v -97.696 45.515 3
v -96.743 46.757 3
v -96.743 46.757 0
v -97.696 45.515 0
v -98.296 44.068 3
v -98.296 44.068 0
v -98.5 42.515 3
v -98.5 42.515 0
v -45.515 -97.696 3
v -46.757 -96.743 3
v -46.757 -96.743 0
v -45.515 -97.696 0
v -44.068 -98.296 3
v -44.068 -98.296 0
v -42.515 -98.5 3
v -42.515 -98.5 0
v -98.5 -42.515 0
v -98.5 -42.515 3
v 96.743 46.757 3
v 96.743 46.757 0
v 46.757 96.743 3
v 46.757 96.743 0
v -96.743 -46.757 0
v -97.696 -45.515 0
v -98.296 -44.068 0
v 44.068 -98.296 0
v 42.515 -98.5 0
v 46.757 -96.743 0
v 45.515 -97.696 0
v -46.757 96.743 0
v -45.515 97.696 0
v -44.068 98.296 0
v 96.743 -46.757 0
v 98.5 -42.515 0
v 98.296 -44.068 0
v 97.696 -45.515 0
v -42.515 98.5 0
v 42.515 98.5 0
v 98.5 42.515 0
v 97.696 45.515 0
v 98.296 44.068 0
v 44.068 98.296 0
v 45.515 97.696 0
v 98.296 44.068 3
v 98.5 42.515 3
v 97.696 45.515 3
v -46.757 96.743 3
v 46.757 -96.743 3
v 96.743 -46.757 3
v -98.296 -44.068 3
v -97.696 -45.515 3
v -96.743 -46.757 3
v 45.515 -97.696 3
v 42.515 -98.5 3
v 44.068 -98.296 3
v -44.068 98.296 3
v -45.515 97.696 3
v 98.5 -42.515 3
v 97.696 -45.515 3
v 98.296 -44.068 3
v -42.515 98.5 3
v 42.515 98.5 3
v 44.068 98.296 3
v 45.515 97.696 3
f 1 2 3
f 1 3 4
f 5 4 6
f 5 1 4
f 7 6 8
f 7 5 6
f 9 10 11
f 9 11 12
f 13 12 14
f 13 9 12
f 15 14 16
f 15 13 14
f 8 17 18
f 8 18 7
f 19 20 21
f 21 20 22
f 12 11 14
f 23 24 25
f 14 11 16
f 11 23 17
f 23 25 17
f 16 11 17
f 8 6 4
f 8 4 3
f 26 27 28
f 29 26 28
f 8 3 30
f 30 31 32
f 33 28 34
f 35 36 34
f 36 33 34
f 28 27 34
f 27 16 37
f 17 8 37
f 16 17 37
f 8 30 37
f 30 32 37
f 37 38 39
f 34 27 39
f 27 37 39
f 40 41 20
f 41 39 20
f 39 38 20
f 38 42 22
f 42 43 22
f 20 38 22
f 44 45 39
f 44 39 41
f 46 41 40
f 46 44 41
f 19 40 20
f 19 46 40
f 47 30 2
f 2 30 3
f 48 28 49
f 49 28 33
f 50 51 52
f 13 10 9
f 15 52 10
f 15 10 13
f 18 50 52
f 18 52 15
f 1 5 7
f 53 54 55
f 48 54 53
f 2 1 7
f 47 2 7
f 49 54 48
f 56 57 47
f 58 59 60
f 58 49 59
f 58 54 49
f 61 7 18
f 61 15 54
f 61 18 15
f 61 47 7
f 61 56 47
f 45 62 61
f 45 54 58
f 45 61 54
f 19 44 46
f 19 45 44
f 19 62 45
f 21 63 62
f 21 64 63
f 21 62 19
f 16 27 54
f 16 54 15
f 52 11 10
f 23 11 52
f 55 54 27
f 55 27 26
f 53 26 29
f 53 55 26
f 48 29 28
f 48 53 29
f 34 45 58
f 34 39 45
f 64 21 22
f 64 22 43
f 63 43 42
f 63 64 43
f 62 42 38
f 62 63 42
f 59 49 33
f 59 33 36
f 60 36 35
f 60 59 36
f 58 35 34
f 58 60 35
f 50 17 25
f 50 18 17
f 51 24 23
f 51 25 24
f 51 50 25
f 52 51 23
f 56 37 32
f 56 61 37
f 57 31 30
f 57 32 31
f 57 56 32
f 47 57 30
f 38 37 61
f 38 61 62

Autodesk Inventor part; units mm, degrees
ref_plane "YZ Plane" through (0, 0, 0) normal (1, 0, 0) x (0, 1, 0)
ref_plane "XZ Plane" through (0, 0, 0) normal (0, 1, 0) x (-1, 0, 0)
ref_plane "XY Plane" through (0, 0, 0) normal (0, 0, 1) x (1, 0, 0)
sketch "Sketch8" plane through (0, 0, 0) normal (0, 0, 1) x (1, 0, 0)
  line L0 (98.5, -98.5) -> (-98.5, -98.5)
  line L1 (-98.5, -98.5) -> (-98.5, 98.5)
  line L2 (-98.5, 98.5) -> (98.5, 98.5)
  line L3 (98.5, 98.5) -> (98.5, -98.5)
  line L4 (98.5, -98.5) -> (-98.5, 98.5) construction
  line L5 (-98.5, -98.5) -> (98.5, 98.5) construction
  line L6 (45, -98.5) -> (98.5, -45)
  line L7 (-45, -98.5) -> (-98.5, -45)
  line L8 (98.5, 45) -> (45, 98.5)
  line L9 (-45, 98.5) -> (-98.5, 45)
  line L10 (0, -98.5) -> (0, 98.5) construction
  point P0 (0, 0)
  dimension "d42" = 197
  dimension "d43" = 197
  dimension "d44" = 90
extrude "Plate3" add sketch "Sketch8" along normal blind 3 contours L0 L7 L1 L9 L2 L8 L3 L6
fillet "Corner Round1" radius 6 8 edges at (-45, -98.5, 1.5) (45, -98.5, 1.5) (98.5, -45, 1.5) (98.5, 45, 1.5) (45, 98.5, 1.5) (-45, 98.5, 1.5) (-98.5, 45, 1.5) (-98.5, -45, 1.5)
equation "\"d43\" = d42"
equation "\"d45\" = Thickness"
equation "\"BendReliefWidth\" = Thickness"
equation "\"BendReliefDepth\" = 0.5 * Thickness"
equation "\"CornerReliefSize\" = 4 * Thickness"
equation "\"MinimumRemnant\" = 2 * Thickness"
equation "\"TransitionRadius\" = BendRadius"
equation "\"JacobiRadiusSize\" = BendRadius"
equation "\"GapSize\" = Thickness"
equation "\"Thickness\" = 3"
equation "\"BendRadius\" = 5"
properties part number "DSB 210 Axis cap" material "Stainless Steel"
